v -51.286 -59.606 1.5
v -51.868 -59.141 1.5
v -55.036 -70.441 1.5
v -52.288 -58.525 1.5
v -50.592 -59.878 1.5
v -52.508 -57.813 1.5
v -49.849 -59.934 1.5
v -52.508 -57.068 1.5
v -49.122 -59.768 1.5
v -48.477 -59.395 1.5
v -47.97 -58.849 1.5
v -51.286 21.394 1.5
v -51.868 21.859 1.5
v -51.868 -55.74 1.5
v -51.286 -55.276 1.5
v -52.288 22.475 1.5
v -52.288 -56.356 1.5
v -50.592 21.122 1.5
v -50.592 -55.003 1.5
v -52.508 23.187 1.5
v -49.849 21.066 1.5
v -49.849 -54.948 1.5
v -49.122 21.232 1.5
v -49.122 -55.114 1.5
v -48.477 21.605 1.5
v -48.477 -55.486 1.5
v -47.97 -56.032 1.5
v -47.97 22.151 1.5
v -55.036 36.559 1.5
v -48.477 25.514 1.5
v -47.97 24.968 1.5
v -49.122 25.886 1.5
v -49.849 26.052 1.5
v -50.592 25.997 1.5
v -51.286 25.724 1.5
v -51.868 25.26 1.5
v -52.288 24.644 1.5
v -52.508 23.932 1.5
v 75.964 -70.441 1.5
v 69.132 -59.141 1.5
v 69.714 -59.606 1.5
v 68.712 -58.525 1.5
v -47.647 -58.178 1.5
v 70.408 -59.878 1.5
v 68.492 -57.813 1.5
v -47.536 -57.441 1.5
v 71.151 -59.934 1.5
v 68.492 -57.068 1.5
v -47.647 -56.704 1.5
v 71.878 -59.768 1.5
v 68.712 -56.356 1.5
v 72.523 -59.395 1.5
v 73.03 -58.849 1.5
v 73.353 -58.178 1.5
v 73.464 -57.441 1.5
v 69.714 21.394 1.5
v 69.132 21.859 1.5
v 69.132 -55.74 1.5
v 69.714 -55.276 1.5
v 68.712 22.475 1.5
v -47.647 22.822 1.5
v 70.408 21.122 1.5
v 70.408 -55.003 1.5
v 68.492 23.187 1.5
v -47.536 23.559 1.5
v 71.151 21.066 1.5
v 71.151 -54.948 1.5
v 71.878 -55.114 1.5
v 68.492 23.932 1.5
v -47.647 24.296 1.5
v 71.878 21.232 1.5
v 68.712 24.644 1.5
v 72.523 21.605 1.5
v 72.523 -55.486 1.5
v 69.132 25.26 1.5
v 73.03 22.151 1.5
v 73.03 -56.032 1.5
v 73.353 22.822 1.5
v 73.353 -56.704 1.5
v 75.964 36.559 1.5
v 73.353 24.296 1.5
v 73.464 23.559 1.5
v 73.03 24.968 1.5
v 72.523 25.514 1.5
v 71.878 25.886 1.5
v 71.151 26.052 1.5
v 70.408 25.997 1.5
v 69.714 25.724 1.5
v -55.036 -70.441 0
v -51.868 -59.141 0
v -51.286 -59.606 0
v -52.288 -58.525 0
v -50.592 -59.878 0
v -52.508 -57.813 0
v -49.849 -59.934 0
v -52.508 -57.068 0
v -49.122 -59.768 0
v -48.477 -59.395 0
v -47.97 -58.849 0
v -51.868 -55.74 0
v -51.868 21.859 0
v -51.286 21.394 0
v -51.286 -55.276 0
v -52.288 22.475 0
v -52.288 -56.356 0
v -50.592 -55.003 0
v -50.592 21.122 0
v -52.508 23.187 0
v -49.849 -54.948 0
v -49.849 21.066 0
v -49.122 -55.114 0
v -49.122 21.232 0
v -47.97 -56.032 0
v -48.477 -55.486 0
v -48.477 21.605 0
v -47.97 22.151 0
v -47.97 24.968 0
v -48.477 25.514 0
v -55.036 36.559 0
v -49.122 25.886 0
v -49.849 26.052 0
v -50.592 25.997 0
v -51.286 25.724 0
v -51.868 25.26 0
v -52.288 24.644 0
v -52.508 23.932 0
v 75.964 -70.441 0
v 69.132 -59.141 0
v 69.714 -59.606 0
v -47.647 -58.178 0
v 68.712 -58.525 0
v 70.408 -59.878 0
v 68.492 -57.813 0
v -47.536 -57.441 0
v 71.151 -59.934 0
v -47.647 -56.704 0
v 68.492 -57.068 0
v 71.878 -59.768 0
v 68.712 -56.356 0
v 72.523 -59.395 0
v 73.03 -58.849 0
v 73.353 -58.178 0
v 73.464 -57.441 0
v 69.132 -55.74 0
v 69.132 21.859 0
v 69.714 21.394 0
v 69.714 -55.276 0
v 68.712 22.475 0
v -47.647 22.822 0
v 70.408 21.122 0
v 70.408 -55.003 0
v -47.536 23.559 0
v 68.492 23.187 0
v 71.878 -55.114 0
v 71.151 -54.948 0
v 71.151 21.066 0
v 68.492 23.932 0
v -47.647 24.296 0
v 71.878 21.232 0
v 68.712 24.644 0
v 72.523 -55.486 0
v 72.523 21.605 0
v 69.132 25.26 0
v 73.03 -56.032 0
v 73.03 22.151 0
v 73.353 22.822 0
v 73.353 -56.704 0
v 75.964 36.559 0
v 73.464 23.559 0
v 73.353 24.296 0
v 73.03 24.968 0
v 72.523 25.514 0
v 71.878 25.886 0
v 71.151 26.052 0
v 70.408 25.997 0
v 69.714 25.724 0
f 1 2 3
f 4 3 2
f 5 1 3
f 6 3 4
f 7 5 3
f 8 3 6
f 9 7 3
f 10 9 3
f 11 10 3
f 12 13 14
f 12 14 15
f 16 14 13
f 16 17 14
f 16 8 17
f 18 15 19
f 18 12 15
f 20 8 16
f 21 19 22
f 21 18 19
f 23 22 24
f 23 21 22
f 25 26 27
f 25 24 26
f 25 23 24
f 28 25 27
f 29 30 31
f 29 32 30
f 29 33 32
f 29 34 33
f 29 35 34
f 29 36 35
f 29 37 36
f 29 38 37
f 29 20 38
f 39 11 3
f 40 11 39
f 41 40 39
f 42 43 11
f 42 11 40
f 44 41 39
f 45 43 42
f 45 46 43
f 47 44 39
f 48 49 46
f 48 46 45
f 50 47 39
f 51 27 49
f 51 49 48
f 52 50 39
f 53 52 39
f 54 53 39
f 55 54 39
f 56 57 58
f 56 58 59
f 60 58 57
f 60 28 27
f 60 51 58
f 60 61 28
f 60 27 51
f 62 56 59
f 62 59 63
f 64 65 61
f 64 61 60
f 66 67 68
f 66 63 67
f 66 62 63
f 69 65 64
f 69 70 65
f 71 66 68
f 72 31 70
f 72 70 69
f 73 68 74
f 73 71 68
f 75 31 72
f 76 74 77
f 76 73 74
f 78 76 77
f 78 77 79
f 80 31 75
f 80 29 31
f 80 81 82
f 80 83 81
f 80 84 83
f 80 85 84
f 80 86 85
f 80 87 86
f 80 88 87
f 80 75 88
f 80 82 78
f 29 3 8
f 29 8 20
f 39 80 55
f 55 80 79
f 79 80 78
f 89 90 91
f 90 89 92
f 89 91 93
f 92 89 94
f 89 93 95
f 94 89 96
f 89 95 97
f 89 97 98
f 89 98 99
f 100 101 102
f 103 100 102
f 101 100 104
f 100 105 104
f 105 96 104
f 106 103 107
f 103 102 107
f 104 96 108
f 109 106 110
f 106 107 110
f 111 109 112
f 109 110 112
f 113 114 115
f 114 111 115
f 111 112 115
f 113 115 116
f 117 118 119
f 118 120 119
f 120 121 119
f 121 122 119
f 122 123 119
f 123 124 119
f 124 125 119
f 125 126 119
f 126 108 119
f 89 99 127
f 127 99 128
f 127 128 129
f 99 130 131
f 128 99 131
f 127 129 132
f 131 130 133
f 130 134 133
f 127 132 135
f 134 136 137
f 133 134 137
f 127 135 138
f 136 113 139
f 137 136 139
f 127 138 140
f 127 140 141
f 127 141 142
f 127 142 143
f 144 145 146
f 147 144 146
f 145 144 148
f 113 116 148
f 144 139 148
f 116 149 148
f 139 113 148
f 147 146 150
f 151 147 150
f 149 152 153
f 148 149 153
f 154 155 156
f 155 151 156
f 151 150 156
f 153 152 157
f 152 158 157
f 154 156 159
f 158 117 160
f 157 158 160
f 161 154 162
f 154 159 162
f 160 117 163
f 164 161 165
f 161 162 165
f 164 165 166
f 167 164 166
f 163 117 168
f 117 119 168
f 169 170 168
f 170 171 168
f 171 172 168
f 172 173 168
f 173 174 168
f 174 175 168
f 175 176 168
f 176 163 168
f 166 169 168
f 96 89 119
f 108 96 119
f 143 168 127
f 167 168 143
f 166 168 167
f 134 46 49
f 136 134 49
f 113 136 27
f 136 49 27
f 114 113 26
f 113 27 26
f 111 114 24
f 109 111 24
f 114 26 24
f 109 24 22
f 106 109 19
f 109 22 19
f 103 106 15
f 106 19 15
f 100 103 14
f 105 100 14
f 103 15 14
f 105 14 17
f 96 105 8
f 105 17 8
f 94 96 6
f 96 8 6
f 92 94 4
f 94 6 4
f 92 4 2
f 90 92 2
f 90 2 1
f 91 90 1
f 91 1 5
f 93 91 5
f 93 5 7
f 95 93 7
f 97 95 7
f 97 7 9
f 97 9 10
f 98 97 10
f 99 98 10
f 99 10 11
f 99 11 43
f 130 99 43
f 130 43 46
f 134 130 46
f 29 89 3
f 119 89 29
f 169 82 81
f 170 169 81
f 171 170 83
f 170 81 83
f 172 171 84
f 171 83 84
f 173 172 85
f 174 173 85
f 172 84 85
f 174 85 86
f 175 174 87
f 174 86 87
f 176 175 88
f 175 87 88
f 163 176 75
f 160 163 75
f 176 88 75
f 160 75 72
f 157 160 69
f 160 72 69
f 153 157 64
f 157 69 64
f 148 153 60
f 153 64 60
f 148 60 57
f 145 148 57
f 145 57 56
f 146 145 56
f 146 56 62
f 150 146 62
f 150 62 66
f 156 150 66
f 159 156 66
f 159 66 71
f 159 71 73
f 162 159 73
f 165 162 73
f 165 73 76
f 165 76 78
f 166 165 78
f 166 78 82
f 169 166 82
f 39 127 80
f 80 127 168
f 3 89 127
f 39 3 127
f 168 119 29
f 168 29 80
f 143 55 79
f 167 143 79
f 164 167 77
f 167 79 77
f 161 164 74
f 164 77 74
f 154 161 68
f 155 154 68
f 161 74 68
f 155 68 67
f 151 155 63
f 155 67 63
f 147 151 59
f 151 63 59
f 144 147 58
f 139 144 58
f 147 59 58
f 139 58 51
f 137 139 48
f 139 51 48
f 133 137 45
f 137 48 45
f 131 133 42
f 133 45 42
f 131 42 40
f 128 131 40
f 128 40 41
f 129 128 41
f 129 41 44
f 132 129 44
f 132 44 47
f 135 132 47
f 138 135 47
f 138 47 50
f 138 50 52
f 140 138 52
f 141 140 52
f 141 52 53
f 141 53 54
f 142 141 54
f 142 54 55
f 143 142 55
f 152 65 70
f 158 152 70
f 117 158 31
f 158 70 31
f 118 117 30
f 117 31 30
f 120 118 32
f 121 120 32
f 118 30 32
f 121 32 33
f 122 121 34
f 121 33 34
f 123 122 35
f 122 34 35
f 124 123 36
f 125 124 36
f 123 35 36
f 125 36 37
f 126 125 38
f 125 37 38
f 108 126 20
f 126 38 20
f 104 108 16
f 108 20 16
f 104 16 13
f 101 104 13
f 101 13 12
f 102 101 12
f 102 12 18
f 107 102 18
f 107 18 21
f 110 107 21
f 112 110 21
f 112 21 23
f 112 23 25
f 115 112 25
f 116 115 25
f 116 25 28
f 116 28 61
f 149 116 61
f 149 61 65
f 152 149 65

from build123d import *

# Parameters (mm, degrees)
CROQUIS1_W              = 131
CROQUIS1_H              = 107
SALIENTE_EXTRUIR1_DEPTH = 1.5
CORTAR_EXTRUIR1_REACH   = 3.5
CROQUIS2_R              = 2.5


with BuildPart() as part:
    # Croquis1 → Saliente-Extruir1 (new body)
    with BuildSketch(Plane.XY):
        with Locations((10.464475059, -16.940687004)):
            Rectangle(CROQUIS1_W, CROQUIS1_H)
    extrude(amount=SALIENTE_EXTRUIR1_DEPTH)

    # Croquis2 → Cortar-Extruir1 (cut, up to next)
    with BuildSketch(Plane.XY.offset(1.5), mode=Mode.PRIVATE) as cortar_extruir1_sk1:
        with Locations((-50.035524941, 23.559312996)):
            Circle(CROQUIS2_R)
    cortar_extruir1_tool1 = extrude(cortar_extruir1_sk1.sketch, amount=-CORTAR_EXTRUIR1_REACH, mode=Mode.PRIVATE) & part.part
    add(cortar_extruir1_tool1.solids().sort_by_distance((-50.035525, 23.559313, 1.5))[0], mode=Mode.SUBTRACT)
    # Croquis2 → Cortar-Extruir1 (cut, up to next)
    with BuildSketch(Plane.XY.offset(1.5), mode=Mode.PRIVATE) as cortar_extruir1_sk2:
        with Locations((70.964475059, 23.559312996)):
            Circle(CROQUIS2_R)
    cortar_extruir1_tool2 = extrude(cortar_extruir1_sk2.sketch, amount=-CORTAR_EXTRUIR1_REACH, mode=Mode.PRIVATE) & part.part
    add(cortar_extruir1_tool2.solids().sort_by_distance((70.964475, 23.559313, 1.5))[0], mode=Mode.SUBTRACT)
    # Croquis2 → Cortar-Extruir1 (cut, up to next)
    with BuildSketch(Plane.XY.offset(1.5), mode=Mode.PRIVATE) as cortar_extruir1_sk3:
        with Locations((70.964475059, -57.440687004)):
            Circle(CROQUIS2_R)
    cortar_extruir1_tool3 = extrude(cortar_extruir1_sk3.sketch, amount=-CORTAR_EXTRUIR1_REACH, mode=Mode.PRIVATE) & part.part
    add(cortar_extruir1_tool3.solids().sort_by_distance((70.964475, -57.440687, 1.5))[0], mode=Mode.SUBTRACT)
    # Croquis2 → Cortar-Extruir1 (cut, up to next)
    with BuildSketch(Plane.XY.offset(1.5), mode=Mode.PRIVATE) as cortar_extruir1_sk4:
        with Locations((-50.035524941, -57.440687004)):
            Circle(CROQUIS2_R)
    cortar_extruir1_tool4 = extrude(cortar_extruir1_sk4.sketch, amount=-CORTAR_EXTRUIR1_REACH, mode=Mode.PRIVATE) & part.part
    add(cortar_extruir1_tool4.solids().sort_by_distance((-50.035525, -57.440687, 1.5))[0], mode=Mode.SUBTRACT)


solid = part.part
